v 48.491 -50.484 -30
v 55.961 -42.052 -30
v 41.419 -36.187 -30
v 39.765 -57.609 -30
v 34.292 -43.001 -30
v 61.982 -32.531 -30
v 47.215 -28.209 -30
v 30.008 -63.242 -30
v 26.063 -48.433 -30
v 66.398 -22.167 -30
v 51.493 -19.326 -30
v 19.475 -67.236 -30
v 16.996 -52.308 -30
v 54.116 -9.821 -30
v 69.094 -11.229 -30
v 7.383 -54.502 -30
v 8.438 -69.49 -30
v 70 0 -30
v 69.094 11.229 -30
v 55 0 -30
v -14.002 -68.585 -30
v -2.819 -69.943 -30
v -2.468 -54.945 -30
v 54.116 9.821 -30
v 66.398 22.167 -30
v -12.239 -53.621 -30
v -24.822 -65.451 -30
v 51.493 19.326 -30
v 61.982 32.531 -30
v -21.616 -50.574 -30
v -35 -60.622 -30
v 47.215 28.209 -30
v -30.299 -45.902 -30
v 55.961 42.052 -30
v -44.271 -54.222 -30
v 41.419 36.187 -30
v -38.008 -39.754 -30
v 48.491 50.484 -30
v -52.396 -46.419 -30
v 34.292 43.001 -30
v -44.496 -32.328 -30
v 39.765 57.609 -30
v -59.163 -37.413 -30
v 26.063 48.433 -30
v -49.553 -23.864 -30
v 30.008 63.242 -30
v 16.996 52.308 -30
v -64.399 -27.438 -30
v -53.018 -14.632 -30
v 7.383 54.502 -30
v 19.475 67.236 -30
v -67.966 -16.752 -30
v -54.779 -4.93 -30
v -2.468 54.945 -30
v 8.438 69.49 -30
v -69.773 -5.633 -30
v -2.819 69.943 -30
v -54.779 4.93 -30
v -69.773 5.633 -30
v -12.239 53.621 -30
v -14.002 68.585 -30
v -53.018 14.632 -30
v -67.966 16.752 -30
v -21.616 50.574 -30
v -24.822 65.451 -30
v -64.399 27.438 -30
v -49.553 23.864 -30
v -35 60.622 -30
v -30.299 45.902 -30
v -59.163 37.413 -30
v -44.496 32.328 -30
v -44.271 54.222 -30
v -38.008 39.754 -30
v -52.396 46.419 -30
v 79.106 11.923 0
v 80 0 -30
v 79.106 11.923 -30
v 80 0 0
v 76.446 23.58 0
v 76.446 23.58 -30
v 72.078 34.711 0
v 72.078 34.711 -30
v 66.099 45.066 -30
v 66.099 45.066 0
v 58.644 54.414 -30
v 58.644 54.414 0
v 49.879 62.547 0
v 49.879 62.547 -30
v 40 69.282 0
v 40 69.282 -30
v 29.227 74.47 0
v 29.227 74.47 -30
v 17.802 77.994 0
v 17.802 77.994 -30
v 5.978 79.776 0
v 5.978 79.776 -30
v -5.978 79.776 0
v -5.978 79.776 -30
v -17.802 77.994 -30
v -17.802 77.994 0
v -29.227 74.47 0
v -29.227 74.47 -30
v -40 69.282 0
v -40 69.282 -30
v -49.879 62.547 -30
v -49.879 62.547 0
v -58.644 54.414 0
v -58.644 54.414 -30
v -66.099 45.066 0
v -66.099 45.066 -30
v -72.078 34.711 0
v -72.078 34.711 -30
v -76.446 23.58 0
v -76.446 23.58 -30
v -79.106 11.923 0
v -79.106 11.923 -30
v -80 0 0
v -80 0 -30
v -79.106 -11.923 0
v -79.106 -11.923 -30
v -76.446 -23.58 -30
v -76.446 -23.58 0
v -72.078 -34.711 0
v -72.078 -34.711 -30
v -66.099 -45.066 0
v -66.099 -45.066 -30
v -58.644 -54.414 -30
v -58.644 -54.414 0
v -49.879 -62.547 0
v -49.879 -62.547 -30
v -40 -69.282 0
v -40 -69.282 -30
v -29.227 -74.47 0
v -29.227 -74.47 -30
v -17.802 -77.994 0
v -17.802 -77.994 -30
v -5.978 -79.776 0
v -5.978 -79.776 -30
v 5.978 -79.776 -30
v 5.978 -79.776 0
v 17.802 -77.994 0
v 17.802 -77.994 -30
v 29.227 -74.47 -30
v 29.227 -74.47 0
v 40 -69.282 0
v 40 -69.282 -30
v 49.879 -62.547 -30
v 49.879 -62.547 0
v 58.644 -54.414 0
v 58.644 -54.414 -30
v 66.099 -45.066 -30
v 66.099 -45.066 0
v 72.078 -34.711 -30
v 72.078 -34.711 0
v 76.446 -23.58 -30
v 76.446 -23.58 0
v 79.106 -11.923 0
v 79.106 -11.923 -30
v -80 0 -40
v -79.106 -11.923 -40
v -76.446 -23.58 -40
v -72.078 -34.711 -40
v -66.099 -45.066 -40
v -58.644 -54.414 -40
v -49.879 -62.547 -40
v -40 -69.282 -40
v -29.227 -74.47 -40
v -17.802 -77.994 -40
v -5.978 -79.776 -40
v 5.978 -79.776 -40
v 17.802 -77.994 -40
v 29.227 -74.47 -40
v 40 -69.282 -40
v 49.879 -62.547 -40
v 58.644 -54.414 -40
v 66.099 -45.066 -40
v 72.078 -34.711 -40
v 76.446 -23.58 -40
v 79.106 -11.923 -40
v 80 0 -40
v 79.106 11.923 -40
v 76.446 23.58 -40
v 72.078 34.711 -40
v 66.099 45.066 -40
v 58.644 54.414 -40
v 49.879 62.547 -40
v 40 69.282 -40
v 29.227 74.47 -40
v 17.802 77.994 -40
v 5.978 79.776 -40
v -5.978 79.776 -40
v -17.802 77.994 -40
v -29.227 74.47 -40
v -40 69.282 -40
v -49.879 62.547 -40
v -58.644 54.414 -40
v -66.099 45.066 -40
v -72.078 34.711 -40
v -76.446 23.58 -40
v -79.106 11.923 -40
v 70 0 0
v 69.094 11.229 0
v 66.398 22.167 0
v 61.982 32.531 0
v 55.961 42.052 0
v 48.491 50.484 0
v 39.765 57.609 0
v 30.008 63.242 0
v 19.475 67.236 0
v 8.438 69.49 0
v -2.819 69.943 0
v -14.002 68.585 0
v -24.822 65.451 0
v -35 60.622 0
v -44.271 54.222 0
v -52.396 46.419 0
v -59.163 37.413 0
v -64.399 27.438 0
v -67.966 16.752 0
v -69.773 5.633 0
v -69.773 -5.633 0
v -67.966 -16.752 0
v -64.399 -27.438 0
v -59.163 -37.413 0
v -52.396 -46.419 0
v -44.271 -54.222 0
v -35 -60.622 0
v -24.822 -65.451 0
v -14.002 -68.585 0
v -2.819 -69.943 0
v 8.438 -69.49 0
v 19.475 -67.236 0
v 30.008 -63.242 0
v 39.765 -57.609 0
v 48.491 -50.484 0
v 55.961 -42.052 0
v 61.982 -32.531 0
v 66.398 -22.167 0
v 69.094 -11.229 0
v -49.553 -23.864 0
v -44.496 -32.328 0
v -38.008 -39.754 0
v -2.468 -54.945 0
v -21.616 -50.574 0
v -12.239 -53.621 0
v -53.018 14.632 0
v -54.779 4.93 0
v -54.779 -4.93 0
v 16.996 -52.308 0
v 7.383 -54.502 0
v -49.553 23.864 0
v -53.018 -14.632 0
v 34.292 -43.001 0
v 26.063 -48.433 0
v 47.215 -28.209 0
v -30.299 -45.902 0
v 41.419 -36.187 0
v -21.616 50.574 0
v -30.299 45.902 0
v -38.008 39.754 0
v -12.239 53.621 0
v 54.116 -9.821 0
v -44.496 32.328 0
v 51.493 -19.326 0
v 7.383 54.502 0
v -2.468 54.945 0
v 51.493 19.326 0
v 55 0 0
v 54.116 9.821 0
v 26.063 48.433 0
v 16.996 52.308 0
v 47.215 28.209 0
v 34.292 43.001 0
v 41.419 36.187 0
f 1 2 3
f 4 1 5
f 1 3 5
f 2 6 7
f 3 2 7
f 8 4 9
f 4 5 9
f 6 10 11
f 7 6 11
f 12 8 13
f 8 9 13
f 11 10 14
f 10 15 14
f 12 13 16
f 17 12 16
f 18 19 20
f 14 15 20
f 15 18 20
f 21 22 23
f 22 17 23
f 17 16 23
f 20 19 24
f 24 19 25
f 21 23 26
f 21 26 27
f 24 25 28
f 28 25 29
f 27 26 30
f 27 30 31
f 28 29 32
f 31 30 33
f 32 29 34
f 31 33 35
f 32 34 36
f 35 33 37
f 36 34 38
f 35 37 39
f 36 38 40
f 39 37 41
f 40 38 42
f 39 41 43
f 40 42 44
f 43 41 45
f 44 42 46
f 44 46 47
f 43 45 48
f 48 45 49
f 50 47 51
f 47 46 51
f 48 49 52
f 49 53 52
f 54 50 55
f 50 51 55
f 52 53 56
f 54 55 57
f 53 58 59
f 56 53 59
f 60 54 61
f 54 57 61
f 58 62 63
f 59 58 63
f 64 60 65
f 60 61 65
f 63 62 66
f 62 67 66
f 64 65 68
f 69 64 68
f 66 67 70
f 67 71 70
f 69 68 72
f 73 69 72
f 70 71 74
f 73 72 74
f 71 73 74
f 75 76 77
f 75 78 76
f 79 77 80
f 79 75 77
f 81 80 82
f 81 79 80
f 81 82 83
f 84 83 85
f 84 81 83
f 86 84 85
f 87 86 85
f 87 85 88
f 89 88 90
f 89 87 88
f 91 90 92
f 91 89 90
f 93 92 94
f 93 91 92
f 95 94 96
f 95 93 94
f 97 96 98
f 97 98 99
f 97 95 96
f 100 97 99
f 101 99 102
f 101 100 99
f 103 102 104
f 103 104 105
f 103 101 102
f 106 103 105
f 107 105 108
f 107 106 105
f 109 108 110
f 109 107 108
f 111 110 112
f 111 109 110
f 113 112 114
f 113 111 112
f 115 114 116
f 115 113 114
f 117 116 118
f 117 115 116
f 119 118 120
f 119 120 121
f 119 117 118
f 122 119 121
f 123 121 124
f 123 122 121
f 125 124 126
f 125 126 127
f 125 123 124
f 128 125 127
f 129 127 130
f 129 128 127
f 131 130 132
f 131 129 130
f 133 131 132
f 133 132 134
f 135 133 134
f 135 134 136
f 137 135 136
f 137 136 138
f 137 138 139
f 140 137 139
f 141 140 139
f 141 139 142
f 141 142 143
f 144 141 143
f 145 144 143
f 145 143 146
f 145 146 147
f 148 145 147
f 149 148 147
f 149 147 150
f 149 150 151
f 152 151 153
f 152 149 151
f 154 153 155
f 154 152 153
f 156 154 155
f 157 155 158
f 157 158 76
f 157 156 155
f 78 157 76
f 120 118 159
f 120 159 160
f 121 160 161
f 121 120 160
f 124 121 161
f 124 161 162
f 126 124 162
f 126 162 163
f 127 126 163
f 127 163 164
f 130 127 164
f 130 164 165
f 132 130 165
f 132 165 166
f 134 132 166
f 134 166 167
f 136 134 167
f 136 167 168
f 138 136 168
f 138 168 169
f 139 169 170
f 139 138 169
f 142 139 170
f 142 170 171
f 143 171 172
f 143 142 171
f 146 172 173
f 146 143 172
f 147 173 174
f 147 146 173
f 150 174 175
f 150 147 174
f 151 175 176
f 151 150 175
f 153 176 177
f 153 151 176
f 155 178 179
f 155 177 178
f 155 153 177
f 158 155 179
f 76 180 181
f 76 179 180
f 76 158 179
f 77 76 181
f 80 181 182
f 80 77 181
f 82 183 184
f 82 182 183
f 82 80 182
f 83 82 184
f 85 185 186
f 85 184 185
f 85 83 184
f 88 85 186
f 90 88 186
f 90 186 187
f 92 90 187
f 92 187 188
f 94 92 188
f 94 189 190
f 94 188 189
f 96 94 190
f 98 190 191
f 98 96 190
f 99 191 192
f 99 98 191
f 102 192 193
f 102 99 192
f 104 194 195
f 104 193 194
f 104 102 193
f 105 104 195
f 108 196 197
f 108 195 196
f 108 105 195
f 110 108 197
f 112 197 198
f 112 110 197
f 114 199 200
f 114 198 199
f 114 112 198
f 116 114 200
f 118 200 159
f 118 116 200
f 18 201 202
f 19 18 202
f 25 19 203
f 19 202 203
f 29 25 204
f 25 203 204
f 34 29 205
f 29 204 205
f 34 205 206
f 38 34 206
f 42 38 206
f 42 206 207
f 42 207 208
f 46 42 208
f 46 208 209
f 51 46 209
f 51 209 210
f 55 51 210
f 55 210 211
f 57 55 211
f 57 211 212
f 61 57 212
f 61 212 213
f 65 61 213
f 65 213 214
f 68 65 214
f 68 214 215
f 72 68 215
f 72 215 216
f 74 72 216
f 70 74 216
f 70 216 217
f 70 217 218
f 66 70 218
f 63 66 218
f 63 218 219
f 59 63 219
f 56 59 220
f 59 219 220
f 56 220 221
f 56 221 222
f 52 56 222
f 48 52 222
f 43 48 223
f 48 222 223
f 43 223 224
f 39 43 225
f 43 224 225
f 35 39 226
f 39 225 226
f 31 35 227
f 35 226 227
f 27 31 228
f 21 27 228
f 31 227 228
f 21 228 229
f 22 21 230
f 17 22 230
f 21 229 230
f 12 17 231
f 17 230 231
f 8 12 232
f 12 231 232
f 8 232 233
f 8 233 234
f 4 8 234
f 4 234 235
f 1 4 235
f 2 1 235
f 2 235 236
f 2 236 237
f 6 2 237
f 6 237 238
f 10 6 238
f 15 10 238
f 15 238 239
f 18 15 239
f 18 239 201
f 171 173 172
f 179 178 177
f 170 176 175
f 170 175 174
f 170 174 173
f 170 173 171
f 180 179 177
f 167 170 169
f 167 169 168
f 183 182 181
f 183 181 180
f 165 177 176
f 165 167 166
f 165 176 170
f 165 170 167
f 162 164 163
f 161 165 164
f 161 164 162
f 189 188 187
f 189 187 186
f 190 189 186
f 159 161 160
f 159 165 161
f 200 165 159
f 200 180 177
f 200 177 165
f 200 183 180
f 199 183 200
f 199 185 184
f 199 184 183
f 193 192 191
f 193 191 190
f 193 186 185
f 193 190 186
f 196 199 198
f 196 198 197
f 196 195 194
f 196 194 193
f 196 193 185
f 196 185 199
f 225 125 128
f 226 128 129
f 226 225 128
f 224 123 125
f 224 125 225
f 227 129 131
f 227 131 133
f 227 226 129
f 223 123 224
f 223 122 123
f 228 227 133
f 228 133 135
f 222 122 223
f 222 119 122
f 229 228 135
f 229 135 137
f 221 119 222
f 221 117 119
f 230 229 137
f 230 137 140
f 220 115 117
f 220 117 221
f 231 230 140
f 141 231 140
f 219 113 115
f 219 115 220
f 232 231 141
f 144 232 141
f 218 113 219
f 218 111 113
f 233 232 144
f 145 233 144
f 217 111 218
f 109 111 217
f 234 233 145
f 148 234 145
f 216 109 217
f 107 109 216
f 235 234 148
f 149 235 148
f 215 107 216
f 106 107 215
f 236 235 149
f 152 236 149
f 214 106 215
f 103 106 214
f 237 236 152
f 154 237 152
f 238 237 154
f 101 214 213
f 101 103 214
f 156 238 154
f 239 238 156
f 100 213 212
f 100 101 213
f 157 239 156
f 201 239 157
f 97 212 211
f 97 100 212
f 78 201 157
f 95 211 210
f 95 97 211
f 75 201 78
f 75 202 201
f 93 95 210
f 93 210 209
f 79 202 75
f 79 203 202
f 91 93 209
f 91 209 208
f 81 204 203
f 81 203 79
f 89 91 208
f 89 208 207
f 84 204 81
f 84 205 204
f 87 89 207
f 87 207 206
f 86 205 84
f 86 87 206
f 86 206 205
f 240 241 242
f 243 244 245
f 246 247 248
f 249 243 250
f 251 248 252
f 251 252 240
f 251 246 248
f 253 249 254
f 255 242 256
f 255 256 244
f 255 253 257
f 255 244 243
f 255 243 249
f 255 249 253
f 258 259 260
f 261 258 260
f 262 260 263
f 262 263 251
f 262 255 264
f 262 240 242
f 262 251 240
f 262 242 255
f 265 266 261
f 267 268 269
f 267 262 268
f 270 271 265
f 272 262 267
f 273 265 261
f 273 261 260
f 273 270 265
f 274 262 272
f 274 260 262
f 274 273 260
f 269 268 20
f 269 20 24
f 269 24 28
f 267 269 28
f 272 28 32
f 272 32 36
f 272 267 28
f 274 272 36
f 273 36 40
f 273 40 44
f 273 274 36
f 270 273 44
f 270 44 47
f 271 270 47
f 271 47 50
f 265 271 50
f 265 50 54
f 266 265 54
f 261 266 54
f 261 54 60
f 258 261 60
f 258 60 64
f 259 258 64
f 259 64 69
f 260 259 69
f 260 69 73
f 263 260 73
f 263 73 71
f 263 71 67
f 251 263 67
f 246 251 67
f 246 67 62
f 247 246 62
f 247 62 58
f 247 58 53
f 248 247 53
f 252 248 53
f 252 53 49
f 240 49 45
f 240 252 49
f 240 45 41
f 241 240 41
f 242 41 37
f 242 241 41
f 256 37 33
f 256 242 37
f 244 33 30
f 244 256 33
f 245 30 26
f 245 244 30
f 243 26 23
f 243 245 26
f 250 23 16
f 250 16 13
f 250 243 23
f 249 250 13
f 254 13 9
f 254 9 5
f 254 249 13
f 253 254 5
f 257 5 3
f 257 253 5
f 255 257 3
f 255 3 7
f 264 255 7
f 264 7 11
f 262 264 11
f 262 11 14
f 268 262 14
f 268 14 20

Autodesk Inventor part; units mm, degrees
ref_plane "YZ Plane" through (0, 0, 0) normal (1, 0, 0) x (0, 1, 0)
ref_plane "XZ Plane" through (0, 0, 0) normal (0, 1, 0) x (-1, 0, 0)
ref_plane "XY Plane" through (0, 0, 0) normal (0, 0, 1) x (1, 0, 0)
sketch "草圖1" plane through (0, 0, 0) normal (0, 0, 1) x (1, 0, 0)
  circle A0 centre (0, 0) radius 80
  circle A1 centre (0, 0) radius 70
  circle A2 centre (0, 0) radius 55
  dimension "d0" = 160
  dimension "d1" = 140
  dimension "d2" = 110
extrude "擠出1" add sketch "草圖1" against normal blind 30
sketch "草圖2" plane through (0, 0, -30) normal (0, 0, -1) x (-1, 0, 0)
  circle A0 centre (0, 0) radius 80 projected
extrude "擠出2" add sketch "草圖2" along normal blind 10
sketch "草圖3" plane through (0, 0, -40) normal (0, 0, -1) x (-1, 0, 0)
  circle A0 centre (0, 0) radius 25
  dimension "d7" = 50
sketch "草圖4" plane through (0, 0, 0) normal (0, 0, 1) x (1, 0, 0)
  circle A0 centre (0, 0) radius 80 projected
  circle A1 centre (0, 0) radius 70 projected
  line L0 (0, 0) -> (-69.282, -40) construction
  line L1 (0, 0) -> (69.282, -40) construction
  line L2 (0, 0) -> (80, 0) construction
  line L3 (0, 0) -> (-80, 0) construction
  circle A2 centre (0, 0) radius 80 projected
  line L4 (-69.282, -40) -> (-61.4878, -35.5)
  line L5 (69.282, -40) -> (61.4878, -35.5)
  circle A3 centre (0, 0) radius 70 projected
  arc A4 (-61.4878, -35.5) -> (61.4878, -35.5) centre (0, 0) ccw
  dimension "d10" = 30
  dimension "d11" = 30
  dimension "d13" = 71
sketch "草圖5" plane through (0, 0, 0) normal (0, 1, 0) x (-1, 0, 0)
  line L0 (-59.2626, 395) -> (59.2626, 395) construction
  line L1 (0, 0) -> (0, 395) construction
  line L2 (66.7748, 395) -> (-66.7748, 395) construction
  line L3 (67.5187, 0) -> (67.5187, 395) construction
  line L4 (-67.5187, 0) -> (-67.5187, 395) construction
  arc A0 (67.5187, 375.1961) -> (-67.5187, 375.1961) centre (0, 270) ccw
  line L5 (67.5187, 375.1961) -> (67.5187, 415)
  line L6 (-67.5187, 375.1961) -> (-67.5187, 415)
  line L7 (-67.5187, 415) -> (67.5187, 415)
  dimension "d19" = 125
  dimension "d20" = 20
properties part number "螺旋鉤子底座"
